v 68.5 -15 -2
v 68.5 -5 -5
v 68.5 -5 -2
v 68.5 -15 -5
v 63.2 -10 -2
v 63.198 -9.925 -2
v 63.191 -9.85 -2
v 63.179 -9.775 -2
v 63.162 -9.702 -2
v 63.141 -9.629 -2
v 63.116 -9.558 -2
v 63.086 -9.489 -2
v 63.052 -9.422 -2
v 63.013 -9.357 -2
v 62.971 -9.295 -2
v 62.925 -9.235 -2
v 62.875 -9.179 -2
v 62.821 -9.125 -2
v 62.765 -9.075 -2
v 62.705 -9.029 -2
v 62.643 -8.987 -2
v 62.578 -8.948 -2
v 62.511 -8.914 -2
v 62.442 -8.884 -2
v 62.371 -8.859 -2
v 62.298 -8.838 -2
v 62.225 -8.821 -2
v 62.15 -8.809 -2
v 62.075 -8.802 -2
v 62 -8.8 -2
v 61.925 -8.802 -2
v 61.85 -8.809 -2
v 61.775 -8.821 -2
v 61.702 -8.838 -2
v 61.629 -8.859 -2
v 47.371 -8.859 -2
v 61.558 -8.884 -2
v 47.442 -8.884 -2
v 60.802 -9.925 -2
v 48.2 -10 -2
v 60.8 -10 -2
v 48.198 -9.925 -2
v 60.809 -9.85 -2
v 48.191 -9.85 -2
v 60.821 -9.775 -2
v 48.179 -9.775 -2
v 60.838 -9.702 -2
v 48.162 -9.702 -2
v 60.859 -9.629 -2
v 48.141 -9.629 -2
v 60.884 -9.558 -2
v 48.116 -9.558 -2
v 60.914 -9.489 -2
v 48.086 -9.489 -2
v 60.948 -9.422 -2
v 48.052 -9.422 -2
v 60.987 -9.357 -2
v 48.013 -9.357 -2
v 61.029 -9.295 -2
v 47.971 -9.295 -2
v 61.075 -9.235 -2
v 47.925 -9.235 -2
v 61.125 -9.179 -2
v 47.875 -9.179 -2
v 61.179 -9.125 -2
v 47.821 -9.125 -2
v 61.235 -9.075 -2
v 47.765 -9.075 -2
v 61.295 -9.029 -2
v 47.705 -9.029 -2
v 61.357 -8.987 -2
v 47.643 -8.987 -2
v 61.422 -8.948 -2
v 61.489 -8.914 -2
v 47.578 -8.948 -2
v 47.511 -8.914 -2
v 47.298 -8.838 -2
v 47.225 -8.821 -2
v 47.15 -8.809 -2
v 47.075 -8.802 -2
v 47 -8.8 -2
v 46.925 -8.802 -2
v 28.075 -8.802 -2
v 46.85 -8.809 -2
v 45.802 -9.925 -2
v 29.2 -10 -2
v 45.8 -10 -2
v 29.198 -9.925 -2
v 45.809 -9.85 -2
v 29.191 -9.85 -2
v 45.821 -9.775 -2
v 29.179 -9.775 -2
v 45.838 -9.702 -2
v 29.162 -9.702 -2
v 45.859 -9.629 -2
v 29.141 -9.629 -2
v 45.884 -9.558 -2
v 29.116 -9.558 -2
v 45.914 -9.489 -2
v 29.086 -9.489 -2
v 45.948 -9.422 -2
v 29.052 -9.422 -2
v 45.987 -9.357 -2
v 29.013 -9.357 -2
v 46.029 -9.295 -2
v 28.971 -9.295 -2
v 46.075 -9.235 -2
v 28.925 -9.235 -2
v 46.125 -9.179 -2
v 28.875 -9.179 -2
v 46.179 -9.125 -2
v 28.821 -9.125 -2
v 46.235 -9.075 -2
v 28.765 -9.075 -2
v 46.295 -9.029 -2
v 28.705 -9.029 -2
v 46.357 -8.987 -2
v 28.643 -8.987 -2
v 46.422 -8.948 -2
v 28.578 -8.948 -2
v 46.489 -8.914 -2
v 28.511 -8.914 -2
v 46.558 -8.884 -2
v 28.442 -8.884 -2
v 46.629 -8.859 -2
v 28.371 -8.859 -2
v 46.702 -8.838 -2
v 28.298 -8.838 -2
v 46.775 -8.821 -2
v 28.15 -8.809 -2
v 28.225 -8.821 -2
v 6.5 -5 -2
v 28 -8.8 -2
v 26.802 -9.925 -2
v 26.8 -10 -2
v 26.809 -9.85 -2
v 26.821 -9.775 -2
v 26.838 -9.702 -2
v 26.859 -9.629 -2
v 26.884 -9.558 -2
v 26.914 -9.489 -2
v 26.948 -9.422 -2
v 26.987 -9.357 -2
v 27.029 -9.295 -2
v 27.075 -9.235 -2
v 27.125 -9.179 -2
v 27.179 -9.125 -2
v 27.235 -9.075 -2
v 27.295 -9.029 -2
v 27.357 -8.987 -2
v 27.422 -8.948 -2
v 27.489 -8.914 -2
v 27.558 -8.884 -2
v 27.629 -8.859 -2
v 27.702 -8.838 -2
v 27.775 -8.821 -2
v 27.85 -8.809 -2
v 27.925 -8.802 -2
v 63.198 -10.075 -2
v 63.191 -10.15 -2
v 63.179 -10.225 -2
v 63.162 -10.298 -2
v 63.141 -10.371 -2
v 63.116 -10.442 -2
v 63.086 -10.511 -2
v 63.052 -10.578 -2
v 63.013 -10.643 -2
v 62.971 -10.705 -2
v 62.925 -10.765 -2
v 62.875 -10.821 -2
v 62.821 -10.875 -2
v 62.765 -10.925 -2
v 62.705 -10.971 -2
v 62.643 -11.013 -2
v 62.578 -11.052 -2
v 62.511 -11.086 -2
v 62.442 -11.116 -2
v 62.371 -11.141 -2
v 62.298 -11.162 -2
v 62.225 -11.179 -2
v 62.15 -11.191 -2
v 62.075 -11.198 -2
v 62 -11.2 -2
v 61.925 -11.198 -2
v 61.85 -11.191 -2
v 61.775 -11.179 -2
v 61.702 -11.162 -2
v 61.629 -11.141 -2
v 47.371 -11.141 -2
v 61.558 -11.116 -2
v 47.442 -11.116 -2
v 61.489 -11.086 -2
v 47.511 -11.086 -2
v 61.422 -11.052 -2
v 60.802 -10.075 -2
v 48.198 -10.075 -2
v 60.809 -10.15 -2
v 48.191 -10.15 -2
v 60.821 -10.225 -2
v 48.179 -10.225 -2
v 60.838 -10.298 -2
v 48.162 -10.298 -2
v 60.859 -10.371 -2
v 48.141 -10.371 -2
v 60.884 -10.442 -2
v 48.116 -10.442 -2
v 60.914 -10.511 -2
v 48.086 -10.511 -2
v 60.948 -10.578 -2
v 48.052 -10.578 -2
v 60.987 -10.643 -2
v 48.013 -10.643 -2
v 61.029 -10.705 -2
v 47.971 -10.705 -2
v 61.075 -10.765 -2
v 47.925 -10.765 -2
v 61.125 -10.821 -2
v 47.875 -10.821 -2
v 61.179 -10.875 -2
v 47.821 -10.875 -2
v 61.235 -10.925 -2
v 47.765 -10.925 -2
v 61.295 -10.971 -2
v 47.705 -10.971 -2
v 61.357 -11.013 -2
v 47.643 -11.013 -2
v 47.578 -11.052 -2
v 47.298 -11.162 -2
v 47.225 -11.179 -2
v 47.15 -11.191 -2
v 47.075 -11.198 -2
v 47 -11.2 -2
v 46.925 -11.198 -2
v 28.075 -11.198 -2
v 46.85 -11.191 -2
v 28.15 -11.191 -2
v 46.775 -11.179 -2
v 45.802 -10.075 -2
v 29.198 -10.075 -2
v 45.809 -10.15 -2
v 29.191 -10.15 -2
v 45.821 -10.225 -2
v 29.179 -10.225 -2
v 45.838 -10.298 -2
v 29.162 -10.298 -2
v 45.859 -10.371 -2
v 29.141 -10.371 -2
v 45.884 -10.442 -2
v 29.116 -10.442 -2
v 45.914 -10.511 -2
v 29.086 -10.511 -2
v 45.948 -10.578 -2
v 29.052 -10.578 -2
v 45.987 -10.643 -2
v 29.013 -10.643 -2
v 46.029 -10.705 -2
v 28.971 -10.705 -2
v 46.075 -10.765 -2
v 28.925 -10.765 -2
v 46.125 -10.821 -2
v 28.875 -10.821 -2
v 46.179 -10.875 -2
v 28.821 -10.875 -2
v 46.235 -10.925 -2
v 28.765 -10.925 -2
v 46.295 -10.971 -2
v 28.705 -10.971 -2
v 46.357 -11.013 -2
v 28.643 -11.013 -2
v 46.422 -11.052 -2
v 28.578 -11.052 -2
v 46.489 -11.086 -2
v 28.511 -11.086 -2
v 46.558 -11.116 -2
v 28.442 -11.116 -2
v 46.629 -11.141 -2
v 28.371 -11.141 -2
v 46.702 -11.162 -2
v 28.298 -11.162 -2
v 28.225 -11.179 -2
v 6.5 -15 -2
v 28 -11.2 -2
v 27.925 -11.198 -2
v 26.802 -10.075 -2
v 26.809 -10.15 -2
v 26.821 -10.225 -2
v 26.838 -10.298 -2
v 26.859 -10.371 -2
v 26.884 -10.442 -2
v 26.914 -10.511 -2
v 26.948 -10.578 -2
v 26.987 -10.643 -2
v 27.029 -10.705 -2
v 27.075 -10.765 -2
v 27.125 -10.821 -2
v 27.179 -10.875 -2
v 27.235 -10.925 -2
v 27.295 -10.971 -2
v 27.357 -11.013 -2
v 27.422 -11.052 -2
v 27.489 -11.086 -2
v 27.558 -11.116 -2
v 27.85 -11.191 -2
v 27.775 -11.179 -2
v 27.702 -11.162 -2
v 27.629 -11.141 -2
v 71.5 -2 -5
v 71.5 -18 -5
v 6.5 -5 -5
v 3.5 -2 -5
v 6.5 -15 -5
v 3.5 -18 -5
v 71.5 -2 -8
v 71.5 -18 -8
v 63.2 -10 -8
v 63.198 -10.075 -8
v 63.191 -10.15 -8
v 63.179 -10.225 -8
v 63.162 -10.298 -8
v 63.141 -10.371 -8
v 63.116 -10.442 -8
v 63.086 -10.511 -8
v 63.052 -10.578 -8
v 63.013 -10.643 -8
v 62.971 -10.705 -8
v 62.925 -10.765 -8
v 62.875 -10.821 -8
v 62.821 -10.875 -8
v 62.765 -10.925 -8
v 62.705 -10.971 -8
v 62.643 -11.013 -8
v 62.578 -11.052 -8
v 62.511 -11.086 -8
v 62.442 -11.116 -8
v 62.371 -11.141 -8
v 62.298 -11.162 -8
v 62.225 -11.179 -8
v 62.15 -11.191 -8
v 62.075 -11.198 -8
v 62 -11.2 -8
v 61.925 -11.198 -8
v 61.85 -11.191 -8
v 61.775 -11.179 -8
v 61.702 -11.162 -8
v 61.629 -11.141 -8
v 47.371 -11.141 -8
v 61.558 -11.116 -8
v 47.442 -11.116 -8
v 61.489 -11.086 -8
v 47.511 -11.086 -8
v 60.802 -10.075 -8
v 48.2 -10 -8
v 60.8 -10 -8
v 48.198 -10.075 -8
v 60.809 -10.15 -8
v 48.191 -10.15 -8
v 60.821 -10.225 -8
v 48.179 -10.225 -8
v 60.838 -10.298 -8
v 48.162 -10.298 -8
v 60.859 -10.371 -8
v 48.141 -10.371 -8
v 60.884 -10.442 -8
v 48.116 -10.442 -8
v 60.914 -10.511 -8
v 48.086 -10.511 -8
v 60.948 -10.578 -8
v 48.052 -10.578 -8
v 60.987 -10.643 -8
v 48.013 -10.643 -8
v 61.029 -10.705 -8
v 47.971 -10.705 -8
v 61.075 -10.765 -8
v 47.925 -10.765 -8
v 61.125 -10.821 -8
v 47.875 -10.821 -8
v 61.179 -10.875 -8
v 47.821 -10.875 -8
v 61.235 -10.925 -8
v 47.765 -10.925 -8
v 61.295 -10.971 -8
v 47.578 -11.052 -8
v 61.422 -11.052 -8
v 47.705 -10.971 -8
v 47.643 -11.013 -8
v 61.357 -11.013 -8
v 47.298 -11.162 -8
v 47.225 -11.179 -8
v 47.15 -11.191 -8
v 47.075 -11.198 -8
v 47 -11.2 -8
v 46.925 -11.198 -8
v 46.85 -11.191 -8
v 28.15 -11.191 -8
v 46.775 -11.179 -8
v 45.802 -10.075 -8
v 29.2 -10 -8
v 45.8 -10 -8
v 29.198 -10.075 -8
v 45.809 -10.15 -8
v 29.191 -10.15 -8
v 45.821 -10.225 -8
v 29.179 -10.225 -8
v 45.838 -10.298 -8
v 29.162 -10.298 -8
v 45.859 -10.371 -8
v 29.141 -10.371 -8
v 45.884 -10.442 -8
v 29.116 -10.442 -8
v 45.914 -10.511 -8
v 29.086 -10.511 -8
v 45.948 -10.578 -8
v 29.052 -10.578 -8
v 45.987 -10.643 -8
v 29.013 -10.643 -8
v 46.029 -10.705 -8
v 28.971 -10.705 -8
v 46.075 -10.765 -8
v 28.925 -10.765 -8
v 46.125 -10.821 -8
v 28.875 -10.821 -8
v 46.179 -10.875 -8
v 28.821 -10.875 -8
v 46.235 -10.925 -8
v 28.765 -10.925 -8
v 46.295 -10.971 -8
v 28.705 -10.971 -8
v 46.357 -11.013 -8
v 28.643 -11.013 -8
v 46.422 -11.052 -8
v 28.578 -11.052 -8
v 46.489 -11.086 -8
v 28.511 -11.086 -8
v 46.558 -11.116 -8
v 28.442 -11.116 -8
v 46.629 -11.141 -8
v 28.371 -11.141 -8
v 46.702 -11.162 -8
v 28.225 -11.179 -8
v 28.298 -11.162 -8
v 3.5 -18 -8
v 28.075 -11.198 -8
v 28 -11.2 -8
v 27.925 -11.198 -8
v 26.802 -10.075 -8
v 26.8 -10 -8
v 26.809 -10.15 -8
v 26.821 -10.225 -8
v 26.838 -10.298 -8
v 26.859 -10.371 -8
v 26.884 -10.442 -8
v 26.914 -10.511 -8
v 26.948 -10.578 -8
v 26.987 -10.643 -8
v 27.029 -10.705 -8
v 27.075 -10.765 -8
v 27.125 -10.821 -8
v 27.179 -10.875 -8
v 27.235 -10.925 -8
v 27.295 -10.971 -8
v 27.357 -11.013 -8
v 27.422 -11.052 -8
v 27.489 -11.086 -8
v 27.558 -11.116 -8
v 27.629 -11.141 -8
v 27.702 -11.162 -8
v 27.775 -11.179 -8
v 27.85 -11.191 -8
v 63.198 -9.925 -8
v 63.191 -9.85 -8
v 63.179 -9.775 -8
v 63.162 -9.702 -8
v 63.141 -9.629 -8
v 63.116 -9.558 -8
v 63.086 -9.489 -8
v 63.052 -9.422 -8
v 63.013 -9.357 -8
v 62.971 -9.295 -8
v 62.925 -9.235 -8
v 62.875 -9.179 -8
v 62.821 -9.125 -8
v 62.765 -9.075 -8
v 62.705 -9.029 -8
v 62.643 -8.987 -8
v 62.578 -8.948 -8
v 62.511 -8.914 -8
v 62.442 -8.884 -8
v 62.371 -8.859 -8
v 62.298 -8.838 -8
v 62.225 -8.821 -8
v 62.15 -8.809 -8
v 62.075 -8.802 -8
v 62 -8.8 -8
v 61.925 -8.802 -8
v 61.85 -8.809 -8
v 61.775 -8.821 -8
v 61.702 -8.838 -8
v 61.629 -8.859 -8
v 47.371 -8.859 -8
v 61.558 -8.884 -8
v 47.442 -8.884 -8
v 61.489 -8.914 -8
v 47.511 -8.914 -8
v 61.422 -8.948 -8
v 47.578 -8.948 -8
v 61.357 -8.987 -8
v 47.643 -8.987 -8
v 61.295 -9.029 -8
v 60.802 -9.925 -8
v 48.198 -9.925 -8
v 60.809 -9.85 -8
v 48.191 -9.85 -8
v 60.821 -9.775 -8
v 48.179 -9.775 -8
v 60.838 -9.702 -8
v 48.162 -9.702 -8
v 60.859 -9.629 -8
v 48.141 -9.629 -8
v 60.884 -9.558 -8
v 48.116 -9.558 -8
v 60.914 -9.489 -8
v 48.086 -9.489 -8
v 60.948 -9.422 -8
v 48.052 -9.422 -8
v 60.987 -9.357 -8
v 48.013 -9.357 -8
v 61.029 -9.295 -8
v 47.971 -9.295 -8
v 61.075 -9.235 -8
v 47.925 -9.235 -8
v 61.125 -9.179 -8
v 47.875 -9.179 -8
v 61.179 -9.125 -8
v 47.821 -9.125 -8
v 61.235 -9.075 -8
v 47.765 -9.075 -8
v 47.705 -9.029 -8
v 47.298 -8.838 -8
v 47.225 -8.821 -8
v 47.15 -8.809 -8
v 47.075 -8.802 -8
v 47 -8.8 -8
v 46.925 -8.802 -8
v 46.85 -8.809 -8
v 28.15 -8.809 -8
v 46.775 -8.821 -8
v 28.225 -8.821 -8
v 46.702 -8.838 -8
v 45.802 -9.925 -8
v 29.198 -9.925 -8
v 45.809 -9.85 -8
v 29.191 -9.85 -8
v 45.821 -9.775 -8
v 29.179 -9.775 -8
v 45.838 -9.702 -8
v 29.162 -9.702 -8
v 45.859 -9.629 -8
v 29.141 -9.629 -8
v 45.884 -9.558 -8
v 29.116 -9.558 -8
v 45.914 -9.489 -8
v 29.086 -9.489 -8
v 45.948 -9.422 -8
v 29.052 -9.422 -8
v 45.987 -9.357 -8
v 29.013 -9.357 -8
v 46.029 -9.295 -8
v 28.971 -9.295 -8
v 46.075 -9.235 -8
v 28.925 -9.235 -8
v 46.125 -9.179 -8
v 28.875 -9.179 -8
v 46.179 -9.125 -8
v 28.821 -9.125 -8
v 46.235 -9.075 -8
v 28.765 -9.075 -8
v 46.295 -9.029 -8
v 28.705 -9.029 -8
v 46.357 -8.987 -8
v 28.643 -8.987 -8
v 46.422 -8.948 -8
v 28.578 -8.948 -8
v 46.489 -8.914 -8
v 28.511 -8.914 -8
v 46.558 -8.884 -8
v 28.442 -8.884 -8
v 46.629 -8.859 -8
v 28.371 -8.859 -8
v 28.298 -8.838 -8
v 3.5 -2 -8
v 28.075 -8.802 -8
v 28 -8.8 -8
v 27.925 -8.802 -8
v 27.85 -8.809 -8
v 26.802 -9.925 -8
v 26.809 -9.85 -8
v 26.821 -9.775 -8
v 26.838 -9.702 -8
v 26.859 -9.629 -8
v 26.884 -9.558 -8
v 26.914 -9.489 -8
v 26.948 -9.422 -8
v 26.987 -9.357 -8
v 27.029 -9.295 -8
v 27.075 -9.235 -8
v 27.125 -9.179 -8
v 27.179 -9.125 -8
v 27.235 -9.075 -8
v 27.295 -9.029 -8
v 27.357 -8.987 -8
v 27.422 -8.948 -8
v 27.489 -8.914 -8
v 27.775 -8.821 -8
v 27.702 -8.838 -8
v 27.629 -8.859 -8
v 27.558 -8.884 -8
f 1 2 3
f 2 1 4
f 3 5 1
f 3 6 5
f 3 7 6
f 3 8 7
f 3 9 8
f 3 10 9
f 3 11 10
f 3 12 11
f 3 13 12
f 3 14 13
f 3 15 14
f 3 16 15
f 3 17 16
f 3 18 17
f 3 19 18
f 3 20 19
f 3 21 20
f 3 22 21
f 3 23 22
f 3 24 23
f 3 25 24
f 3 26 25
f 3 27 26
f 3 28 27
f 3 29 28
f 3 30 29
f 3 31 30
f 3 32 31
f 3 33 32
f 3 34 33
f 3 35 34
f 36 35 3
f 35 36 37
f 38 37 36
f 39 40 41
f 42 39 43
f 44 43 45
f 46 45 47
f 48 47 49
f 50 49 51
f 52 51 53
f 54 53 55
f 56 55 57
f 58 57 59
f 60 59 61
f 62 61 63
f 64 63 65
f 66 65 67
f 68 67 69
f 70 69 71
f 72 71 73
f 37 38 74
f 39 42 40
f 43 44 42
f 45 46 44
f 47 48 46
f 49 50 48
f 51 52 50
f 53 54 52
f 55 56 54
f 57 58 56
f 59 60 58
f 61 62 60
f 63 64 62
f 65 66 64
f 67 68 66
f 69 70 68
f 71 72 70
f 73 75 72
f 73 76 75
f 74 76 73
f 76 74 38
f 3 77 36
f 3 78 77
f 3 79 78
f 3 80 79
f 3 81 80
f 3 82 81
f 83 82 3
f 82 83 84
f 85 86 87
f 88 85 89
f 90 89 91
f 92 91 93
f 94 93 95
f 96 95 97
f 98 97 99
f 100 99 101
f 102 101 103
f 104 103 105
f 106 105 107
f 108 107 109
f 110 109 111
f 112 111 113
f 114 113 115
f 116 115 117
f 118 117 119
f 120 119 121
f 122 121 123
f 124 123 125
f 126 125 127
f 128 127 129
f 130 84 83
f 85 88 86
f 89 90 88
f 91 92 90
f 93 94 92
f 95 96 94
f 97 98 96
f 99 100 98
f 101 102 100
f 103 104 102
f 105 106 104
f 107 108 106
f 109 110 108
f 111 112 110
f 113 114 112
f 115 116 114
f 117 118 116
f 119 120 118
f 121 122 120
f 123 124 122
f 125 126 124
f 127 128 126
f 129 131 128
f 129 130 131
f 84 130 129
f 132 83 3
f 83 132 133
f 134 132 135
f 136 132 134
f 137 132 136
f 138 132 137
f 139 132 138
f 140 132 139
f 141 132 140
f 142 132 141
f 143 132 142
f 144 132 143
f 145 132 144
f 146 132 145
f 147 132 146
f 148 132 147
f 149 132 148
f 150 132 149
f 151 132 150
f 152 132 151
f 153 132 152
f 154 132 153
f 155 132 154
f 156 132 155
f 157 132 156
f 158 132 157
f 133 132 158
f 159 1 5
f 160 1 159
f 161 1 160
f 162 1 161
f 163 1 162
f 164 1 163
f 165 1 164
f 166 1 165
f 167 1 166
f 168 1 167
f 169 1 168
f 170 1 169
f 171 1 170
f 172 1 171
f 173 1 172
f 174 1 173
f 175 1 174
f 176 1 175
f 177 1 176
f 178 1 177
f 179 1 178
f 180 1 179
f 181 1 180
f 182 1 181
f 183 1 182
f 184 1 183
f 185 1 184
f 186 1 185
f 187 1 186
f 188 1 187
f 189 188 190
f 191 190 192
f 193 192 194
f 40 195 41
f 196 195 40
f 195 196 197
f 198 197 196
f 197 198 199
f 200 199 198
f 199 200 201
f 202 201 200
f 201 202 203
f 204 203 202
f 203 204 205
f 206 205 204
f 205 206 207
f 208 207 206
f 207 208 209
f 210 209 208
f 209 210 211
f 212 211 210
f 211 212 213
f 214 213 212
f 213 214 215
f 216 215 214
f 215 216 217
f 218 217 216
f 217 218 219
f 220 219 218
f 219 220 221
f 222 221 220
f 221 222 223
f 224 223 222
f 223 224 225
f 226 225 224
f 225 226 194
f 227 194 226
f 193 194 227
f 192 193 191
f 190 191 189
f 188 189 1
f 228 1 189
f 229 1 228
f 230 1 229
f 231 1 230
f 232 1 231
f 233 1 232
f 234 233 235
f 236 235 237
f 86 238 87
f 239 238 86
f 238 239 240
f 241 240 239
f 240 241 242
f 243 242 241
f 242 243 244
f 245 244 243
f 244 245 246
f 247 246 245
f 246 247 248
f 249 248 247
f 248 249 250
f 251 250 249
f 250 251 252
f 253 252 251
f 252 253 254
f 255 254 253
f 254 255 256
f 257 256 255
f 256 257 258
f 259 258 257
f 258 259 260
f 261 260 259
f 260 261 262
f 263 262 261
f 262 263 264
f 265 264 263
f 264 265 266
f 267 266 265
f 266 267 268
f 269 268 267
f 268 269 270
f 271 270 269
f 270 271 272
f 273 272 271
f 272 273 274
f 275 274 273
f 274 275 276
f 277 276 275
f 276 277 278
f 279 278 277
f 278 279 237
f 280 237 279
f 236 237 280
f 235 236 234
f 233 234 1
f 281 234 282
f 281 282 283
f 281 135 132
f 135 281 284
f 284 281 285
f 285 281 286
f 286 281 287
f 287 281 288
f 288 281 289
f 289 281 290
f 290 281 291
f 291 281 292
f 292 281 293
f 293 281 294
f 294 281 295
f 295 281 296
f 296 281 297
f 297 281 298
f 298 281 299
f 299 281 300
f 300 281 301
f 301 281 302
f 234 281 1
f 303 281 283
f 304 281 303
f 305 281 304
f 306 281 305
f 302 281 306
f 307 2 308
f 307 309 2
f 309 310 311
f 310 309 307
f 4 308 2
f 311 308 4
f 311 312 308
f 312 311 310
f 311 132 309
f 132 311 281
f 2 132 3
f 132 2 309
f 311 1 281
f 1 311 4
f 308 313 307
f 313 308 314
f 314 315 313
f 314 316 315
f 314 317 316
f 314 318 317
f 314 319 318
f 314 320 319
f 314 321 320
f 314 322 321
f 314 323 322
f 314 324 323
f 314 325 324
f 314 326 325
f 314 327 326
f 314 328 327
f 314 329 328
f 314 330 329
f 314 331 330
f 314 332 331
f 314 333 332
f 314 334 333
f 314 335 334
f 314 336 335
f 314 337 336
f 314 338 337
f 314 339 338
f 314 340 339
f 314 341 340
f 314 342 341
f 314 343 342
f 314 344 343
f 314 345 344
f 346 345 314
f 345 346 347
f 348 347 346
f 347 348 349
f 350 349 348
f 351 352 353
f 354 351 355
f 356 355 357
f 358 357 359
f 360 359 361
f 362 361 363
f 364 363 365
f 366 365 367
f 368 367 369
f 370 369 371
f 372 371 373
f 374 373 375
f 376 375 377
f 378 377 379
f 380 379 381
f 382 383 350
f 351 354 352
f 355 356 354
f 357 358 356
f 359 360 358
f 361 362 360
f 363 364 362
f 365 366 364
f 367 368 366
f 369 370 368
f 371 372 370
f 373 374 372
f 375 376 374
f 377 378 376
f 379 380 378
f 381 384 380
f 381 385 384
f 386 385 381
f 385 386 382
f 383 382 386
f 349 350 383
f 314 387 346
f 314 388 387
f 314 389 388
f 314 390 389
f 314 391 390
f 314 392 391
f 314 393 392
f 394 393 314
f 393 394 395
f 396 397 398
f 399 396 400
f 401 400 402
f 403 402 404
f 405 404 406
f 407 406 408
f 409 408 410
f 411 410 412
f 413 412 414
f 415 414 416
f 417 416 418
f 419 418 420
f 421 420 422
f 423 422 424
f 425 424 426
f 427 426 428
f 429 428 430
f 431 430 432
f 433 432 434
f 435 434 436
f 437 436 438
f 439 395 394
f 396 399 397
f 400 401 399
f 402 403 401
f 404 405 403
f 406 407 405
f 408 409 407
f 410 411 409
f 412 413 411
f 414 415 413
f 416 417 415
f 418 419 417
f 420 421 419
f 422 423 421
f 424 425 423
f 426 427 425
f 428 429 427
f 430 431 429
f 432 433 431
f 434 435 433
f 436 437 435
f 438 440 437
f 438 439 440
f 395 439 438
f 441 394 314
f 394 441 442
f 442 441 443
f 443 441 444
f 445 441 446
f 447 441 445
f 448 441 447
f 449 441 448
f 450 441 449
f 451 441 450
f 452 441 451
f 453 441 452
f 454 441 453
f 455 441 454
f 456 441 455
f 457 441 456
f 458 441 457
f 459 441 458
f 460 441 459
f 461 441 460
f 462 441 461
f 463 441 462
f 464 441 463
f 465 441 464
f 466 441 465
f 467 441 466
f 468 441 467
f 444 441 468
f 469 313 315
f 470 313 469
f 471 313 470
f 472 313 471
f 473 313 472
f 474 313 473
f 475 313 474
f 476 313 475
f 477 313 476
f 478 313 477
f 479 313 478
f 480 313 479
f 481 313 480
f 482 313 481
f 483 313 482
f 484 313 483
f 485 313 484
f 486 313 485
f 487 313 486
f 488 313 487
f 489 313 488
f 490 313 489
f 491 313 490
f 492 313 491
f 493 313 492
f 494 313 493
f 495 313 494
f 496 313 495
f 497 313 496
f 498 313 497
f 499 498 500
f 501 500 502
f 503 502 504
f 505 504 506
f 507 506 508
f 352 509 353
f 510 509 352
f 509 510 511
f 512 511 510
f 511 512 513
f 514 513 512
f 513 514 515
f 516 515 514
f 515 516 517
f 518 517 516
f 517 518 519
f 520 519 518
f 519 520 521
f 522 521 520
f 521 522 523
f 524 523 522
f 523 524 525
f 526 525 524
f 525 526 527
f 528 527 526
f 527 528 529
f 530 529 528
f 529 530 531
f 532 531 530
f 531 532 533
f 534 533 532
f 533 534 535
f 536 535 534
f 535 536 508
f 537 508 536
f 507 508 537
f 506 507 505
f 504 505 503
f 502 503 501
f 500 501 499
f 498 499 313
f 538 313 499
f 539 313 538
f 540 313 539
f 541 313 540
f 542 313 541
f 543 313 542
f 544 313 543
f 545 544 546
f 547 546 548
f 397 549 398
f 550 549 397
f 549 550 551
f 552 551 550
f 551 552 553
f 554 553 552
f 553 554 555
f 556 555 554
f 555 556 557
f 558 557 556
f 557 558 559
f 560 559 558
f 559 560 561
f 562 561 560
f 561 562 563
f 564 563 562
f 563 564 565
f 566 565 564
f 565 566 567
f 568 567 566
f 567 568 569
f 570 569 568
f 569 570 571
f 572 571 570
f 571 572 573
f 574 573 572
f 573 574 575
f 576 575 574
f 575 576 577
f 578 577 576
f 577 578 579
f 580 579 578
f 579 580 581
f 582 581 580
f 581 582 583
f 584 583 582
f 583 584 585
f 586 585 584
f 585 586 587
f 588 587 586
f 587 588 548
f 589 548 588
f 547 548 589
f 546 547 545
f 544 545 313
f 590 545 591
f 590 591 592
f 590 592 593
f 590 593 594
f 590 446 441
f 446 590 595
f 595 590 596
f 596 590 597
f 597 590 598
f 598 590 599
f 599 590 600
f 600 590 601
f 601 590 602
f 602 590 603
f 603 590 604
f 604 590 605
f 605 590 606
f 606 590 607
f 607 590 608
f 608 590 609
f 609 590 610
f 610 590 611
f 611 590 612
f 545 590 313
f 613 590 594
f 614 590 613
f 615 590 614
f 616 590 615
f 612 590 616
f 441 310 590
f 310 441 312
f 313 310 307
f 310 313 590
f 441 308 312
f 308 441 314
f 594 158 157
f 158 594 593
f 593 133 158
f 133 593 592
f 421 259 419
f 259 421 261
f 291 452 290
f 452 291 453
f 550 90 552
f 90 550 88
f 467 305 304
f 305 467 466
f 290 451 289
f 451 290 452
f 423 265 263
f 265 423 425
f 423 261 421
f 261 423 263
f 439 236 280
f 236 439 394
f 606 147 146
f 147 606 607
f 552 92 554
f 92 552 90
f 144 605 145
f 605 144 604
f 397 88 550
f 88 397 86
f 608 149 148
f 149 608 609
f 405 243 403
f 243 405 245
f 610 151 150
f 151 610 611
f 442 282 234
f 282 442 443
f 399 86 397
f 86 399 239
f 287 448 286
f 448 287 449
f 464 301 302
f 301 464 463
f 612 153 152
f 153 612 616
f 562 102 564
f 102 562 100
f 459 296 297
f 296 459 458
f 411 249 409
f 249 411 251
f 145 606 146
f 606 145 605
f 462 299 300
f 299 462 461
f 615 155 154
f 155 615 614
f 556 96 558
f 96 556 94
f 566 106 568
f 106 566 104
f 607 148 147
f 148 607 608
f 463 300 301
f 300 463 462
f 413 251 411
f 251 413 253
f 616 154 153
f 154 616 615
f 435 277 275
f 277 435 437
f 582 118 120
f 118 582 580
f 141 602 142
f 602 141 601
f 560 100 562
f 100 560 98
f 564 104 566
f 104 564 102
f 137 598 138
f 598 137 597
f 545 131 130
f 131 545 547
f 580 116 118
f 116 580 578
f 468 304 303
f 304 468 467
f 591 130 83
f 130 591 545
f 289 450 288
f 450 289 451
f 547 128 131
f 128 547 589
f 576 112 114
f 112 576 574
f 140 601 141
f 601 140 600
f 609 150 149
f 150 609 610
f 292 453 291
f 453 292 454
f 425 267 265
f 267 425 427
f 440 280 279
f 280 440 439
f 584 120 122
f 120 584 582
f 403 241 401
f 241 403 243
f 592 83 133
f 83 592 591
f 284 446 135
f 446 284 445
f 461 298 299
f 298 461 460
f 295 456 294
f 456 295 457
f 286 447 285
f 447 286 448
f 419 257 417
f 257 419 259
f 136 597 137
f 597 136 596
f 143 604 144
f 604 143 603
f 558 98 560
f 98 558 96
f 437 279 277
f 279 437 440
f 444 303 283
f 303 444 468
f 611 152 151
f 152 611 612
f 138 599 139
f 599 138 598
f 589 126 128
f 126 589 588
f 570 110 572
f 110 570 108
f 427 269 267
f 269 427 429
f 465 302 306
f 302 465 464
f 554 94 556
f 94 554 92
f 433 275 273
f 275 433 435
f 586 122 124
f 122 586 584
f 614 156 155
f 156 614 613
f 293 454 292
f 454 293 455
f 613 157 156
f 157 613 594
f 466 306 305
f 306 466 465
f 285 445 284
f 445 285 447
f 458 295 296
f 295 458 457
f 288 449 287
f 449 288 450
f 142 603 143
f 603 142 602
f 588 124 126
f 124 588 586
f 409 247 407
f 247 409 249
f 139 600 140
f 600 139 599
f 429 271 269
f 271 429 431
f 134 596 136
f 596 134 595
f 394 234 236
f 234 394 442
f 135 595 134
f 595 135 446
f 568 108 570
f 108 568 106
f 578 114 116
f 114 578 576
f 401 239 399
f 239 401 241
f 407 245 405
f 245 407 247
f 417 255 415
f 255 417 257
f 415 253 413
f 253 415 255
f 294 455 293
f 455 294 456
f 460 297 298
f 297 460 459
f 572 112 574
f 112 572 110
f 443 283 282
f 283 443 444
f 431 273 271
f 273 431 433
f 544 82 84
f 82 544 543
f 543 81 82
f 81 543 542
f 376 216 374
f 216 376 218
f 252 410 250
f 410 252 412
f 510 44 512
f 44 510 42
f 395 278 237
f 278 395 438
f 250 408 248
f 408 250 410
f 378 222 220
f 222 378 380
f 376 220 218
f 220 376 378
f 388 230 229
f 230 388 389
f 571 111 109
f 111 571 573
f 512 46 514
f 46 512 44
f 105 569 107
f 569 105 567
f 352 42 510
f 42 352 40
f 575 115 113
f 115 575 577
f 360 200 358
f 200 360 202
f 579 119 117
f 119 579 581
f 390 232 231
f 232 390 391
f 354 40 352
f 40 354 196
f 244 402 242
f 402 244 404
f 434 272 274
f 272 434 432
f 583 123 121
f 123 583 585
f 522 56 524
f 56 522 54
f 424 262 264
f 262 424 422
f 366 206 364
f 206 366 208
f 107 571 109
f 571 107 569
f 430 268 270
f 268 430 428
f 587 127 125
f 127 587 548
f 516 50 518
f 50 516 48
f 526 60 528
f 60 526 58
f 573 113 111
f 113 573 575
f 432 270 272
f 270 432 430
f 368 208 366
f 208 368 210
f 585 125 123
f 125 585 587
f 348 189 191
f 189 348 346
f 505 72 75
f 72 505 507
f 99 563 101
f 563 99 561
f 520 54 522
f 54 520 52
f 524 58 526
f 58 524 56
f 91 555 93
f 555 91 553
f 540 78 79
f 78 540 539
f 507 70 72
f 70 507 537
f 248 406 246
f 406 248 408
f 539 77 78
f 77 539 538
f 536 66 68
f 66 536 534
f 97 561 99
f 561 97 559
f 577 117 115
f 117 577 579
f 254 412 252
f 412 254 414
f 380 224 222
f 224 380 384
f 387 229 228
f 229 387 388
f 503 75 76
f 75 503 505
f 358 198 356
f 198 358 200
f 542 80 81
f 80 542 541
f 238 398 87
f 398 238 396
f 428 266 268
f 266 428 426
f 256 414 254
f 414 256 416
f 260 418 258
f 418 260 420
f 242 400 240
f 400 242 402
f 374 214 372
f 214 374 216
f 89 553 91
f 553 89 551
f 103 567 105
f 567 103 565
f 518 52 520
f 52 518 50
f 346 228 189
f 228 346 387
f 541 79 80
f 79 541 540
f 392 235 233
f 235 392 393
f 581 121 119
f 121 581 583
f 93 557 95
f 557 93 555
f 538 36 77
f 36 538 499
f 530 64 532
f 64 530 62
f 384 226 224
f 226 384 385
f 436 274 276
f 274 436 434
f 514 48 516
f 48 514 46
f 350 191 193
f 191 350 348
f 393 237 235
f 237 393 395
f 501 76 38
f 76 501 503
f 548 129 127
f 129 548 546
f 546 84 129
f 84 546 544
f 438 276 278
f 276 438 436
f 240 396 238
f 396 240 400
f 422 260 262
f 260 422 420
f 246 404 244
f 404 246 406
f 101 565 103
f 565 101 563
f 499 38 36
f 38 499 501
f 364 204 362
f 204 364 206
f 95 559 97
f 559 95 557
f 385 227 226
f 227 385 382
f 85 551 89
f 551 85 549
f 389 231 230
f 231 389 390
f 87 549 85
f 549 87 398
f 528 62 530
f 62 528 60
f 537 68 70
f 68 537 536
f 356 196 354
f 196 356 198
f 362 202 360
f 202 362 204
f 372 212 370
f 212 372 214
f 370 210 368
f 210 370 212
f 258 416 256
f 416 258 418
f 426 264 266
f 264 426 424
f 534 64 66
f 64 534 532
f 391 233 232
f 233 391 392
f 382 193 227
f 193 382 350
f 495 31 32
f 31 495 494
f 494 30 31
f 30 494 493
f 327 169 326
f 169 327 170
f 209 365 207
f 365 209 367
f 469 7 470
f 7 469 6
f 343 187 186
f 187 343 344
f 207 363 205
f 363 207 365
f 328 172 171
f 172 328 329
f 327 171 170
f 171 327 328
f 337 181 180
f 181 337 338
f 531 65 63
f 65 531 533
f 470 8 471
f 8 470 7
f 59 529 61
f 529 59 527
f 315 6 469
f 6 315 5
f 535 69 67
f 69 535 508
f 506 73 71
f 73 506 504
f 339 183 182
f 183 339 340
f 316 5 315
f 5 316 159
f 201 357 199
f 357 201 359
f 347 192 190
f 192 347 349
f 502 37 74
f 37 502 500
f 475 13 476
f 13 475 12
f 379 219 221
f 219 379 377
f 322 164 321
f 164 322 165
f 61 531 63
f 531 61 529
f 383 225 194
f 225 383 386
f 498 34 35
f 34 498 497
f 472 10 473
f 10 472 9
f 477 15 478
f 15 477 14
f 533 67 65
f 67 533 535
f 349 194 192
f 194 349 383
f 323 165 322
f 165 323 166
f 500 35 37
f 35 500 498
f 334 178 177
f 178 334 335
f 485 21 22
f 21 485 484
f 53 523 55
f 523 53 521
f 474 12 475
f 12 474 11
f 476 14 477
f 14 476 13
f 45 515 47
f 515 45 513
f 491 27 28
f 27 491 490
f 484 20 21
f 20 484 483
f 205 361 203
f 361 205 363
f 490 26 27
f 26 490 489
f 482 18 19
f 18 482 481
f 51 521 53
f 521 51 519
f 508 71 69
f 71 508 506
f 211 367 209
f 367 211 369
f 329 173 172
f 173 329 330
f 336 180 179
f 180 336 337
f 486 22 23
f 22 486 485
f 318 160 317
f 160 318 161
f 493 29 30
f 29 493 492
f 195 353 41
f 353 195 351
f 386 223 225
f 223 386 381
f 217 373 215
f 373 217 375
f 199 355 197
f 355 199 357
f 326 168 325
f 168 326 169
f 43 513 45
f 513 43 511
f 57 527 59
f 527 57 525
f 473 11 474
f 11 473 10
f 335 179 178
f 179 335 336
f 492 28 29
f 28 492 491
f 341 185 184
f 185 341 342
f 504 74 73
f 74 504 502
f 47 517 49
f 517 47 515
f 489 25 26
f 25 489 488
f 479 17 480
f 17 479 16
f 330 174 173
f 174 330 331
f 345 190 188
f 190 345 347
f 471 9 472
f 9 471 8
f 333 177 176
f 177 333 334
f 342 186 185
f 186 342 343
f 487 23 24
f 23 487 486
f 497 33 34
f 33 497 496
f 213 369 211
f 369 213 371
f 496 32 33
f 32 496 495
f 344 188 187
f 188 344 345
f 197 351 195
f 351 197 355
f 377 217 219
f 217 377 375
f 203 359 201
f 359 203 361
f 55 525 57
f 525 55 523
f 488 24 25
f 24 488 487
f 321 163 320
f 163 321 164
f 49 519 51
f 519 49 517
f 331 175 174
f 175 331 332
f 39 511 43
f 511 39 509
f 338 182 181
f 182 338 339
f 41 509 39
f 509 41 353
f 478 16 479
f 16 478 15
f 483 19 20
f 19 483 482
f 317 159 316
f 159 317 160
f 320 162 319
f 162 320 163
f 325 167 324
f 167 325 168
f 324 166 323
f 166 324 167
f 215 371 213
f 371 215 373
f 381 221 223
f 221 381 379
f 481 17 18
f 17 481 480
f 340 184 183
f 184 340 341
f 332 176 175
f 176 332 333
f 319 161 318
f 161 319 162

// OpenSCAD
difference(){
	union(){

        translate([6.5,-15,-5]){
           cube([75-13,10,3], center=false);
        }        

        translate([6.5-3,-15-3,-8]){
           cube([75-13+6,10+6,3], center=false);
        }        
        
	}
	union() {
        translate([-9.5+75/2,50,17.5]){
            rotate([90,0,0]){
                cylinder(h=200, r=4.15, $fn=100, center=false);
            }
        }
        translate([9.5+75/2,50,17.5]){
            rotate([90,0,0]){
                cylinder(h=200, r=4.15, $fn=100, center=false);
            }
        }        
        translate([-10,-10,17.-11]){
            rotate([0,90,0]){
                cylinder(h=200, r=4.15, $fn=100, center=false);
            }
        }        


        translate([75/2-9.5,-10,-20]){
            rotate([0,0,90]){
                cylinder(h=100, r=1.2, $fn=100, center=false);
            }
        }        
        translate([75/2+9.5,-10,-20]){
            rotate([0,0,90]){
                cylinder(h=100, r=1.2, $fn=100, center=false);
            }
        }        
        translate([75/2+9.5+15,-10,-20]){
            rotate([0,0,90]){
                cylinder(h=100, r=1.2, $fn=100, center=false);
            }
        }        


	}
}
